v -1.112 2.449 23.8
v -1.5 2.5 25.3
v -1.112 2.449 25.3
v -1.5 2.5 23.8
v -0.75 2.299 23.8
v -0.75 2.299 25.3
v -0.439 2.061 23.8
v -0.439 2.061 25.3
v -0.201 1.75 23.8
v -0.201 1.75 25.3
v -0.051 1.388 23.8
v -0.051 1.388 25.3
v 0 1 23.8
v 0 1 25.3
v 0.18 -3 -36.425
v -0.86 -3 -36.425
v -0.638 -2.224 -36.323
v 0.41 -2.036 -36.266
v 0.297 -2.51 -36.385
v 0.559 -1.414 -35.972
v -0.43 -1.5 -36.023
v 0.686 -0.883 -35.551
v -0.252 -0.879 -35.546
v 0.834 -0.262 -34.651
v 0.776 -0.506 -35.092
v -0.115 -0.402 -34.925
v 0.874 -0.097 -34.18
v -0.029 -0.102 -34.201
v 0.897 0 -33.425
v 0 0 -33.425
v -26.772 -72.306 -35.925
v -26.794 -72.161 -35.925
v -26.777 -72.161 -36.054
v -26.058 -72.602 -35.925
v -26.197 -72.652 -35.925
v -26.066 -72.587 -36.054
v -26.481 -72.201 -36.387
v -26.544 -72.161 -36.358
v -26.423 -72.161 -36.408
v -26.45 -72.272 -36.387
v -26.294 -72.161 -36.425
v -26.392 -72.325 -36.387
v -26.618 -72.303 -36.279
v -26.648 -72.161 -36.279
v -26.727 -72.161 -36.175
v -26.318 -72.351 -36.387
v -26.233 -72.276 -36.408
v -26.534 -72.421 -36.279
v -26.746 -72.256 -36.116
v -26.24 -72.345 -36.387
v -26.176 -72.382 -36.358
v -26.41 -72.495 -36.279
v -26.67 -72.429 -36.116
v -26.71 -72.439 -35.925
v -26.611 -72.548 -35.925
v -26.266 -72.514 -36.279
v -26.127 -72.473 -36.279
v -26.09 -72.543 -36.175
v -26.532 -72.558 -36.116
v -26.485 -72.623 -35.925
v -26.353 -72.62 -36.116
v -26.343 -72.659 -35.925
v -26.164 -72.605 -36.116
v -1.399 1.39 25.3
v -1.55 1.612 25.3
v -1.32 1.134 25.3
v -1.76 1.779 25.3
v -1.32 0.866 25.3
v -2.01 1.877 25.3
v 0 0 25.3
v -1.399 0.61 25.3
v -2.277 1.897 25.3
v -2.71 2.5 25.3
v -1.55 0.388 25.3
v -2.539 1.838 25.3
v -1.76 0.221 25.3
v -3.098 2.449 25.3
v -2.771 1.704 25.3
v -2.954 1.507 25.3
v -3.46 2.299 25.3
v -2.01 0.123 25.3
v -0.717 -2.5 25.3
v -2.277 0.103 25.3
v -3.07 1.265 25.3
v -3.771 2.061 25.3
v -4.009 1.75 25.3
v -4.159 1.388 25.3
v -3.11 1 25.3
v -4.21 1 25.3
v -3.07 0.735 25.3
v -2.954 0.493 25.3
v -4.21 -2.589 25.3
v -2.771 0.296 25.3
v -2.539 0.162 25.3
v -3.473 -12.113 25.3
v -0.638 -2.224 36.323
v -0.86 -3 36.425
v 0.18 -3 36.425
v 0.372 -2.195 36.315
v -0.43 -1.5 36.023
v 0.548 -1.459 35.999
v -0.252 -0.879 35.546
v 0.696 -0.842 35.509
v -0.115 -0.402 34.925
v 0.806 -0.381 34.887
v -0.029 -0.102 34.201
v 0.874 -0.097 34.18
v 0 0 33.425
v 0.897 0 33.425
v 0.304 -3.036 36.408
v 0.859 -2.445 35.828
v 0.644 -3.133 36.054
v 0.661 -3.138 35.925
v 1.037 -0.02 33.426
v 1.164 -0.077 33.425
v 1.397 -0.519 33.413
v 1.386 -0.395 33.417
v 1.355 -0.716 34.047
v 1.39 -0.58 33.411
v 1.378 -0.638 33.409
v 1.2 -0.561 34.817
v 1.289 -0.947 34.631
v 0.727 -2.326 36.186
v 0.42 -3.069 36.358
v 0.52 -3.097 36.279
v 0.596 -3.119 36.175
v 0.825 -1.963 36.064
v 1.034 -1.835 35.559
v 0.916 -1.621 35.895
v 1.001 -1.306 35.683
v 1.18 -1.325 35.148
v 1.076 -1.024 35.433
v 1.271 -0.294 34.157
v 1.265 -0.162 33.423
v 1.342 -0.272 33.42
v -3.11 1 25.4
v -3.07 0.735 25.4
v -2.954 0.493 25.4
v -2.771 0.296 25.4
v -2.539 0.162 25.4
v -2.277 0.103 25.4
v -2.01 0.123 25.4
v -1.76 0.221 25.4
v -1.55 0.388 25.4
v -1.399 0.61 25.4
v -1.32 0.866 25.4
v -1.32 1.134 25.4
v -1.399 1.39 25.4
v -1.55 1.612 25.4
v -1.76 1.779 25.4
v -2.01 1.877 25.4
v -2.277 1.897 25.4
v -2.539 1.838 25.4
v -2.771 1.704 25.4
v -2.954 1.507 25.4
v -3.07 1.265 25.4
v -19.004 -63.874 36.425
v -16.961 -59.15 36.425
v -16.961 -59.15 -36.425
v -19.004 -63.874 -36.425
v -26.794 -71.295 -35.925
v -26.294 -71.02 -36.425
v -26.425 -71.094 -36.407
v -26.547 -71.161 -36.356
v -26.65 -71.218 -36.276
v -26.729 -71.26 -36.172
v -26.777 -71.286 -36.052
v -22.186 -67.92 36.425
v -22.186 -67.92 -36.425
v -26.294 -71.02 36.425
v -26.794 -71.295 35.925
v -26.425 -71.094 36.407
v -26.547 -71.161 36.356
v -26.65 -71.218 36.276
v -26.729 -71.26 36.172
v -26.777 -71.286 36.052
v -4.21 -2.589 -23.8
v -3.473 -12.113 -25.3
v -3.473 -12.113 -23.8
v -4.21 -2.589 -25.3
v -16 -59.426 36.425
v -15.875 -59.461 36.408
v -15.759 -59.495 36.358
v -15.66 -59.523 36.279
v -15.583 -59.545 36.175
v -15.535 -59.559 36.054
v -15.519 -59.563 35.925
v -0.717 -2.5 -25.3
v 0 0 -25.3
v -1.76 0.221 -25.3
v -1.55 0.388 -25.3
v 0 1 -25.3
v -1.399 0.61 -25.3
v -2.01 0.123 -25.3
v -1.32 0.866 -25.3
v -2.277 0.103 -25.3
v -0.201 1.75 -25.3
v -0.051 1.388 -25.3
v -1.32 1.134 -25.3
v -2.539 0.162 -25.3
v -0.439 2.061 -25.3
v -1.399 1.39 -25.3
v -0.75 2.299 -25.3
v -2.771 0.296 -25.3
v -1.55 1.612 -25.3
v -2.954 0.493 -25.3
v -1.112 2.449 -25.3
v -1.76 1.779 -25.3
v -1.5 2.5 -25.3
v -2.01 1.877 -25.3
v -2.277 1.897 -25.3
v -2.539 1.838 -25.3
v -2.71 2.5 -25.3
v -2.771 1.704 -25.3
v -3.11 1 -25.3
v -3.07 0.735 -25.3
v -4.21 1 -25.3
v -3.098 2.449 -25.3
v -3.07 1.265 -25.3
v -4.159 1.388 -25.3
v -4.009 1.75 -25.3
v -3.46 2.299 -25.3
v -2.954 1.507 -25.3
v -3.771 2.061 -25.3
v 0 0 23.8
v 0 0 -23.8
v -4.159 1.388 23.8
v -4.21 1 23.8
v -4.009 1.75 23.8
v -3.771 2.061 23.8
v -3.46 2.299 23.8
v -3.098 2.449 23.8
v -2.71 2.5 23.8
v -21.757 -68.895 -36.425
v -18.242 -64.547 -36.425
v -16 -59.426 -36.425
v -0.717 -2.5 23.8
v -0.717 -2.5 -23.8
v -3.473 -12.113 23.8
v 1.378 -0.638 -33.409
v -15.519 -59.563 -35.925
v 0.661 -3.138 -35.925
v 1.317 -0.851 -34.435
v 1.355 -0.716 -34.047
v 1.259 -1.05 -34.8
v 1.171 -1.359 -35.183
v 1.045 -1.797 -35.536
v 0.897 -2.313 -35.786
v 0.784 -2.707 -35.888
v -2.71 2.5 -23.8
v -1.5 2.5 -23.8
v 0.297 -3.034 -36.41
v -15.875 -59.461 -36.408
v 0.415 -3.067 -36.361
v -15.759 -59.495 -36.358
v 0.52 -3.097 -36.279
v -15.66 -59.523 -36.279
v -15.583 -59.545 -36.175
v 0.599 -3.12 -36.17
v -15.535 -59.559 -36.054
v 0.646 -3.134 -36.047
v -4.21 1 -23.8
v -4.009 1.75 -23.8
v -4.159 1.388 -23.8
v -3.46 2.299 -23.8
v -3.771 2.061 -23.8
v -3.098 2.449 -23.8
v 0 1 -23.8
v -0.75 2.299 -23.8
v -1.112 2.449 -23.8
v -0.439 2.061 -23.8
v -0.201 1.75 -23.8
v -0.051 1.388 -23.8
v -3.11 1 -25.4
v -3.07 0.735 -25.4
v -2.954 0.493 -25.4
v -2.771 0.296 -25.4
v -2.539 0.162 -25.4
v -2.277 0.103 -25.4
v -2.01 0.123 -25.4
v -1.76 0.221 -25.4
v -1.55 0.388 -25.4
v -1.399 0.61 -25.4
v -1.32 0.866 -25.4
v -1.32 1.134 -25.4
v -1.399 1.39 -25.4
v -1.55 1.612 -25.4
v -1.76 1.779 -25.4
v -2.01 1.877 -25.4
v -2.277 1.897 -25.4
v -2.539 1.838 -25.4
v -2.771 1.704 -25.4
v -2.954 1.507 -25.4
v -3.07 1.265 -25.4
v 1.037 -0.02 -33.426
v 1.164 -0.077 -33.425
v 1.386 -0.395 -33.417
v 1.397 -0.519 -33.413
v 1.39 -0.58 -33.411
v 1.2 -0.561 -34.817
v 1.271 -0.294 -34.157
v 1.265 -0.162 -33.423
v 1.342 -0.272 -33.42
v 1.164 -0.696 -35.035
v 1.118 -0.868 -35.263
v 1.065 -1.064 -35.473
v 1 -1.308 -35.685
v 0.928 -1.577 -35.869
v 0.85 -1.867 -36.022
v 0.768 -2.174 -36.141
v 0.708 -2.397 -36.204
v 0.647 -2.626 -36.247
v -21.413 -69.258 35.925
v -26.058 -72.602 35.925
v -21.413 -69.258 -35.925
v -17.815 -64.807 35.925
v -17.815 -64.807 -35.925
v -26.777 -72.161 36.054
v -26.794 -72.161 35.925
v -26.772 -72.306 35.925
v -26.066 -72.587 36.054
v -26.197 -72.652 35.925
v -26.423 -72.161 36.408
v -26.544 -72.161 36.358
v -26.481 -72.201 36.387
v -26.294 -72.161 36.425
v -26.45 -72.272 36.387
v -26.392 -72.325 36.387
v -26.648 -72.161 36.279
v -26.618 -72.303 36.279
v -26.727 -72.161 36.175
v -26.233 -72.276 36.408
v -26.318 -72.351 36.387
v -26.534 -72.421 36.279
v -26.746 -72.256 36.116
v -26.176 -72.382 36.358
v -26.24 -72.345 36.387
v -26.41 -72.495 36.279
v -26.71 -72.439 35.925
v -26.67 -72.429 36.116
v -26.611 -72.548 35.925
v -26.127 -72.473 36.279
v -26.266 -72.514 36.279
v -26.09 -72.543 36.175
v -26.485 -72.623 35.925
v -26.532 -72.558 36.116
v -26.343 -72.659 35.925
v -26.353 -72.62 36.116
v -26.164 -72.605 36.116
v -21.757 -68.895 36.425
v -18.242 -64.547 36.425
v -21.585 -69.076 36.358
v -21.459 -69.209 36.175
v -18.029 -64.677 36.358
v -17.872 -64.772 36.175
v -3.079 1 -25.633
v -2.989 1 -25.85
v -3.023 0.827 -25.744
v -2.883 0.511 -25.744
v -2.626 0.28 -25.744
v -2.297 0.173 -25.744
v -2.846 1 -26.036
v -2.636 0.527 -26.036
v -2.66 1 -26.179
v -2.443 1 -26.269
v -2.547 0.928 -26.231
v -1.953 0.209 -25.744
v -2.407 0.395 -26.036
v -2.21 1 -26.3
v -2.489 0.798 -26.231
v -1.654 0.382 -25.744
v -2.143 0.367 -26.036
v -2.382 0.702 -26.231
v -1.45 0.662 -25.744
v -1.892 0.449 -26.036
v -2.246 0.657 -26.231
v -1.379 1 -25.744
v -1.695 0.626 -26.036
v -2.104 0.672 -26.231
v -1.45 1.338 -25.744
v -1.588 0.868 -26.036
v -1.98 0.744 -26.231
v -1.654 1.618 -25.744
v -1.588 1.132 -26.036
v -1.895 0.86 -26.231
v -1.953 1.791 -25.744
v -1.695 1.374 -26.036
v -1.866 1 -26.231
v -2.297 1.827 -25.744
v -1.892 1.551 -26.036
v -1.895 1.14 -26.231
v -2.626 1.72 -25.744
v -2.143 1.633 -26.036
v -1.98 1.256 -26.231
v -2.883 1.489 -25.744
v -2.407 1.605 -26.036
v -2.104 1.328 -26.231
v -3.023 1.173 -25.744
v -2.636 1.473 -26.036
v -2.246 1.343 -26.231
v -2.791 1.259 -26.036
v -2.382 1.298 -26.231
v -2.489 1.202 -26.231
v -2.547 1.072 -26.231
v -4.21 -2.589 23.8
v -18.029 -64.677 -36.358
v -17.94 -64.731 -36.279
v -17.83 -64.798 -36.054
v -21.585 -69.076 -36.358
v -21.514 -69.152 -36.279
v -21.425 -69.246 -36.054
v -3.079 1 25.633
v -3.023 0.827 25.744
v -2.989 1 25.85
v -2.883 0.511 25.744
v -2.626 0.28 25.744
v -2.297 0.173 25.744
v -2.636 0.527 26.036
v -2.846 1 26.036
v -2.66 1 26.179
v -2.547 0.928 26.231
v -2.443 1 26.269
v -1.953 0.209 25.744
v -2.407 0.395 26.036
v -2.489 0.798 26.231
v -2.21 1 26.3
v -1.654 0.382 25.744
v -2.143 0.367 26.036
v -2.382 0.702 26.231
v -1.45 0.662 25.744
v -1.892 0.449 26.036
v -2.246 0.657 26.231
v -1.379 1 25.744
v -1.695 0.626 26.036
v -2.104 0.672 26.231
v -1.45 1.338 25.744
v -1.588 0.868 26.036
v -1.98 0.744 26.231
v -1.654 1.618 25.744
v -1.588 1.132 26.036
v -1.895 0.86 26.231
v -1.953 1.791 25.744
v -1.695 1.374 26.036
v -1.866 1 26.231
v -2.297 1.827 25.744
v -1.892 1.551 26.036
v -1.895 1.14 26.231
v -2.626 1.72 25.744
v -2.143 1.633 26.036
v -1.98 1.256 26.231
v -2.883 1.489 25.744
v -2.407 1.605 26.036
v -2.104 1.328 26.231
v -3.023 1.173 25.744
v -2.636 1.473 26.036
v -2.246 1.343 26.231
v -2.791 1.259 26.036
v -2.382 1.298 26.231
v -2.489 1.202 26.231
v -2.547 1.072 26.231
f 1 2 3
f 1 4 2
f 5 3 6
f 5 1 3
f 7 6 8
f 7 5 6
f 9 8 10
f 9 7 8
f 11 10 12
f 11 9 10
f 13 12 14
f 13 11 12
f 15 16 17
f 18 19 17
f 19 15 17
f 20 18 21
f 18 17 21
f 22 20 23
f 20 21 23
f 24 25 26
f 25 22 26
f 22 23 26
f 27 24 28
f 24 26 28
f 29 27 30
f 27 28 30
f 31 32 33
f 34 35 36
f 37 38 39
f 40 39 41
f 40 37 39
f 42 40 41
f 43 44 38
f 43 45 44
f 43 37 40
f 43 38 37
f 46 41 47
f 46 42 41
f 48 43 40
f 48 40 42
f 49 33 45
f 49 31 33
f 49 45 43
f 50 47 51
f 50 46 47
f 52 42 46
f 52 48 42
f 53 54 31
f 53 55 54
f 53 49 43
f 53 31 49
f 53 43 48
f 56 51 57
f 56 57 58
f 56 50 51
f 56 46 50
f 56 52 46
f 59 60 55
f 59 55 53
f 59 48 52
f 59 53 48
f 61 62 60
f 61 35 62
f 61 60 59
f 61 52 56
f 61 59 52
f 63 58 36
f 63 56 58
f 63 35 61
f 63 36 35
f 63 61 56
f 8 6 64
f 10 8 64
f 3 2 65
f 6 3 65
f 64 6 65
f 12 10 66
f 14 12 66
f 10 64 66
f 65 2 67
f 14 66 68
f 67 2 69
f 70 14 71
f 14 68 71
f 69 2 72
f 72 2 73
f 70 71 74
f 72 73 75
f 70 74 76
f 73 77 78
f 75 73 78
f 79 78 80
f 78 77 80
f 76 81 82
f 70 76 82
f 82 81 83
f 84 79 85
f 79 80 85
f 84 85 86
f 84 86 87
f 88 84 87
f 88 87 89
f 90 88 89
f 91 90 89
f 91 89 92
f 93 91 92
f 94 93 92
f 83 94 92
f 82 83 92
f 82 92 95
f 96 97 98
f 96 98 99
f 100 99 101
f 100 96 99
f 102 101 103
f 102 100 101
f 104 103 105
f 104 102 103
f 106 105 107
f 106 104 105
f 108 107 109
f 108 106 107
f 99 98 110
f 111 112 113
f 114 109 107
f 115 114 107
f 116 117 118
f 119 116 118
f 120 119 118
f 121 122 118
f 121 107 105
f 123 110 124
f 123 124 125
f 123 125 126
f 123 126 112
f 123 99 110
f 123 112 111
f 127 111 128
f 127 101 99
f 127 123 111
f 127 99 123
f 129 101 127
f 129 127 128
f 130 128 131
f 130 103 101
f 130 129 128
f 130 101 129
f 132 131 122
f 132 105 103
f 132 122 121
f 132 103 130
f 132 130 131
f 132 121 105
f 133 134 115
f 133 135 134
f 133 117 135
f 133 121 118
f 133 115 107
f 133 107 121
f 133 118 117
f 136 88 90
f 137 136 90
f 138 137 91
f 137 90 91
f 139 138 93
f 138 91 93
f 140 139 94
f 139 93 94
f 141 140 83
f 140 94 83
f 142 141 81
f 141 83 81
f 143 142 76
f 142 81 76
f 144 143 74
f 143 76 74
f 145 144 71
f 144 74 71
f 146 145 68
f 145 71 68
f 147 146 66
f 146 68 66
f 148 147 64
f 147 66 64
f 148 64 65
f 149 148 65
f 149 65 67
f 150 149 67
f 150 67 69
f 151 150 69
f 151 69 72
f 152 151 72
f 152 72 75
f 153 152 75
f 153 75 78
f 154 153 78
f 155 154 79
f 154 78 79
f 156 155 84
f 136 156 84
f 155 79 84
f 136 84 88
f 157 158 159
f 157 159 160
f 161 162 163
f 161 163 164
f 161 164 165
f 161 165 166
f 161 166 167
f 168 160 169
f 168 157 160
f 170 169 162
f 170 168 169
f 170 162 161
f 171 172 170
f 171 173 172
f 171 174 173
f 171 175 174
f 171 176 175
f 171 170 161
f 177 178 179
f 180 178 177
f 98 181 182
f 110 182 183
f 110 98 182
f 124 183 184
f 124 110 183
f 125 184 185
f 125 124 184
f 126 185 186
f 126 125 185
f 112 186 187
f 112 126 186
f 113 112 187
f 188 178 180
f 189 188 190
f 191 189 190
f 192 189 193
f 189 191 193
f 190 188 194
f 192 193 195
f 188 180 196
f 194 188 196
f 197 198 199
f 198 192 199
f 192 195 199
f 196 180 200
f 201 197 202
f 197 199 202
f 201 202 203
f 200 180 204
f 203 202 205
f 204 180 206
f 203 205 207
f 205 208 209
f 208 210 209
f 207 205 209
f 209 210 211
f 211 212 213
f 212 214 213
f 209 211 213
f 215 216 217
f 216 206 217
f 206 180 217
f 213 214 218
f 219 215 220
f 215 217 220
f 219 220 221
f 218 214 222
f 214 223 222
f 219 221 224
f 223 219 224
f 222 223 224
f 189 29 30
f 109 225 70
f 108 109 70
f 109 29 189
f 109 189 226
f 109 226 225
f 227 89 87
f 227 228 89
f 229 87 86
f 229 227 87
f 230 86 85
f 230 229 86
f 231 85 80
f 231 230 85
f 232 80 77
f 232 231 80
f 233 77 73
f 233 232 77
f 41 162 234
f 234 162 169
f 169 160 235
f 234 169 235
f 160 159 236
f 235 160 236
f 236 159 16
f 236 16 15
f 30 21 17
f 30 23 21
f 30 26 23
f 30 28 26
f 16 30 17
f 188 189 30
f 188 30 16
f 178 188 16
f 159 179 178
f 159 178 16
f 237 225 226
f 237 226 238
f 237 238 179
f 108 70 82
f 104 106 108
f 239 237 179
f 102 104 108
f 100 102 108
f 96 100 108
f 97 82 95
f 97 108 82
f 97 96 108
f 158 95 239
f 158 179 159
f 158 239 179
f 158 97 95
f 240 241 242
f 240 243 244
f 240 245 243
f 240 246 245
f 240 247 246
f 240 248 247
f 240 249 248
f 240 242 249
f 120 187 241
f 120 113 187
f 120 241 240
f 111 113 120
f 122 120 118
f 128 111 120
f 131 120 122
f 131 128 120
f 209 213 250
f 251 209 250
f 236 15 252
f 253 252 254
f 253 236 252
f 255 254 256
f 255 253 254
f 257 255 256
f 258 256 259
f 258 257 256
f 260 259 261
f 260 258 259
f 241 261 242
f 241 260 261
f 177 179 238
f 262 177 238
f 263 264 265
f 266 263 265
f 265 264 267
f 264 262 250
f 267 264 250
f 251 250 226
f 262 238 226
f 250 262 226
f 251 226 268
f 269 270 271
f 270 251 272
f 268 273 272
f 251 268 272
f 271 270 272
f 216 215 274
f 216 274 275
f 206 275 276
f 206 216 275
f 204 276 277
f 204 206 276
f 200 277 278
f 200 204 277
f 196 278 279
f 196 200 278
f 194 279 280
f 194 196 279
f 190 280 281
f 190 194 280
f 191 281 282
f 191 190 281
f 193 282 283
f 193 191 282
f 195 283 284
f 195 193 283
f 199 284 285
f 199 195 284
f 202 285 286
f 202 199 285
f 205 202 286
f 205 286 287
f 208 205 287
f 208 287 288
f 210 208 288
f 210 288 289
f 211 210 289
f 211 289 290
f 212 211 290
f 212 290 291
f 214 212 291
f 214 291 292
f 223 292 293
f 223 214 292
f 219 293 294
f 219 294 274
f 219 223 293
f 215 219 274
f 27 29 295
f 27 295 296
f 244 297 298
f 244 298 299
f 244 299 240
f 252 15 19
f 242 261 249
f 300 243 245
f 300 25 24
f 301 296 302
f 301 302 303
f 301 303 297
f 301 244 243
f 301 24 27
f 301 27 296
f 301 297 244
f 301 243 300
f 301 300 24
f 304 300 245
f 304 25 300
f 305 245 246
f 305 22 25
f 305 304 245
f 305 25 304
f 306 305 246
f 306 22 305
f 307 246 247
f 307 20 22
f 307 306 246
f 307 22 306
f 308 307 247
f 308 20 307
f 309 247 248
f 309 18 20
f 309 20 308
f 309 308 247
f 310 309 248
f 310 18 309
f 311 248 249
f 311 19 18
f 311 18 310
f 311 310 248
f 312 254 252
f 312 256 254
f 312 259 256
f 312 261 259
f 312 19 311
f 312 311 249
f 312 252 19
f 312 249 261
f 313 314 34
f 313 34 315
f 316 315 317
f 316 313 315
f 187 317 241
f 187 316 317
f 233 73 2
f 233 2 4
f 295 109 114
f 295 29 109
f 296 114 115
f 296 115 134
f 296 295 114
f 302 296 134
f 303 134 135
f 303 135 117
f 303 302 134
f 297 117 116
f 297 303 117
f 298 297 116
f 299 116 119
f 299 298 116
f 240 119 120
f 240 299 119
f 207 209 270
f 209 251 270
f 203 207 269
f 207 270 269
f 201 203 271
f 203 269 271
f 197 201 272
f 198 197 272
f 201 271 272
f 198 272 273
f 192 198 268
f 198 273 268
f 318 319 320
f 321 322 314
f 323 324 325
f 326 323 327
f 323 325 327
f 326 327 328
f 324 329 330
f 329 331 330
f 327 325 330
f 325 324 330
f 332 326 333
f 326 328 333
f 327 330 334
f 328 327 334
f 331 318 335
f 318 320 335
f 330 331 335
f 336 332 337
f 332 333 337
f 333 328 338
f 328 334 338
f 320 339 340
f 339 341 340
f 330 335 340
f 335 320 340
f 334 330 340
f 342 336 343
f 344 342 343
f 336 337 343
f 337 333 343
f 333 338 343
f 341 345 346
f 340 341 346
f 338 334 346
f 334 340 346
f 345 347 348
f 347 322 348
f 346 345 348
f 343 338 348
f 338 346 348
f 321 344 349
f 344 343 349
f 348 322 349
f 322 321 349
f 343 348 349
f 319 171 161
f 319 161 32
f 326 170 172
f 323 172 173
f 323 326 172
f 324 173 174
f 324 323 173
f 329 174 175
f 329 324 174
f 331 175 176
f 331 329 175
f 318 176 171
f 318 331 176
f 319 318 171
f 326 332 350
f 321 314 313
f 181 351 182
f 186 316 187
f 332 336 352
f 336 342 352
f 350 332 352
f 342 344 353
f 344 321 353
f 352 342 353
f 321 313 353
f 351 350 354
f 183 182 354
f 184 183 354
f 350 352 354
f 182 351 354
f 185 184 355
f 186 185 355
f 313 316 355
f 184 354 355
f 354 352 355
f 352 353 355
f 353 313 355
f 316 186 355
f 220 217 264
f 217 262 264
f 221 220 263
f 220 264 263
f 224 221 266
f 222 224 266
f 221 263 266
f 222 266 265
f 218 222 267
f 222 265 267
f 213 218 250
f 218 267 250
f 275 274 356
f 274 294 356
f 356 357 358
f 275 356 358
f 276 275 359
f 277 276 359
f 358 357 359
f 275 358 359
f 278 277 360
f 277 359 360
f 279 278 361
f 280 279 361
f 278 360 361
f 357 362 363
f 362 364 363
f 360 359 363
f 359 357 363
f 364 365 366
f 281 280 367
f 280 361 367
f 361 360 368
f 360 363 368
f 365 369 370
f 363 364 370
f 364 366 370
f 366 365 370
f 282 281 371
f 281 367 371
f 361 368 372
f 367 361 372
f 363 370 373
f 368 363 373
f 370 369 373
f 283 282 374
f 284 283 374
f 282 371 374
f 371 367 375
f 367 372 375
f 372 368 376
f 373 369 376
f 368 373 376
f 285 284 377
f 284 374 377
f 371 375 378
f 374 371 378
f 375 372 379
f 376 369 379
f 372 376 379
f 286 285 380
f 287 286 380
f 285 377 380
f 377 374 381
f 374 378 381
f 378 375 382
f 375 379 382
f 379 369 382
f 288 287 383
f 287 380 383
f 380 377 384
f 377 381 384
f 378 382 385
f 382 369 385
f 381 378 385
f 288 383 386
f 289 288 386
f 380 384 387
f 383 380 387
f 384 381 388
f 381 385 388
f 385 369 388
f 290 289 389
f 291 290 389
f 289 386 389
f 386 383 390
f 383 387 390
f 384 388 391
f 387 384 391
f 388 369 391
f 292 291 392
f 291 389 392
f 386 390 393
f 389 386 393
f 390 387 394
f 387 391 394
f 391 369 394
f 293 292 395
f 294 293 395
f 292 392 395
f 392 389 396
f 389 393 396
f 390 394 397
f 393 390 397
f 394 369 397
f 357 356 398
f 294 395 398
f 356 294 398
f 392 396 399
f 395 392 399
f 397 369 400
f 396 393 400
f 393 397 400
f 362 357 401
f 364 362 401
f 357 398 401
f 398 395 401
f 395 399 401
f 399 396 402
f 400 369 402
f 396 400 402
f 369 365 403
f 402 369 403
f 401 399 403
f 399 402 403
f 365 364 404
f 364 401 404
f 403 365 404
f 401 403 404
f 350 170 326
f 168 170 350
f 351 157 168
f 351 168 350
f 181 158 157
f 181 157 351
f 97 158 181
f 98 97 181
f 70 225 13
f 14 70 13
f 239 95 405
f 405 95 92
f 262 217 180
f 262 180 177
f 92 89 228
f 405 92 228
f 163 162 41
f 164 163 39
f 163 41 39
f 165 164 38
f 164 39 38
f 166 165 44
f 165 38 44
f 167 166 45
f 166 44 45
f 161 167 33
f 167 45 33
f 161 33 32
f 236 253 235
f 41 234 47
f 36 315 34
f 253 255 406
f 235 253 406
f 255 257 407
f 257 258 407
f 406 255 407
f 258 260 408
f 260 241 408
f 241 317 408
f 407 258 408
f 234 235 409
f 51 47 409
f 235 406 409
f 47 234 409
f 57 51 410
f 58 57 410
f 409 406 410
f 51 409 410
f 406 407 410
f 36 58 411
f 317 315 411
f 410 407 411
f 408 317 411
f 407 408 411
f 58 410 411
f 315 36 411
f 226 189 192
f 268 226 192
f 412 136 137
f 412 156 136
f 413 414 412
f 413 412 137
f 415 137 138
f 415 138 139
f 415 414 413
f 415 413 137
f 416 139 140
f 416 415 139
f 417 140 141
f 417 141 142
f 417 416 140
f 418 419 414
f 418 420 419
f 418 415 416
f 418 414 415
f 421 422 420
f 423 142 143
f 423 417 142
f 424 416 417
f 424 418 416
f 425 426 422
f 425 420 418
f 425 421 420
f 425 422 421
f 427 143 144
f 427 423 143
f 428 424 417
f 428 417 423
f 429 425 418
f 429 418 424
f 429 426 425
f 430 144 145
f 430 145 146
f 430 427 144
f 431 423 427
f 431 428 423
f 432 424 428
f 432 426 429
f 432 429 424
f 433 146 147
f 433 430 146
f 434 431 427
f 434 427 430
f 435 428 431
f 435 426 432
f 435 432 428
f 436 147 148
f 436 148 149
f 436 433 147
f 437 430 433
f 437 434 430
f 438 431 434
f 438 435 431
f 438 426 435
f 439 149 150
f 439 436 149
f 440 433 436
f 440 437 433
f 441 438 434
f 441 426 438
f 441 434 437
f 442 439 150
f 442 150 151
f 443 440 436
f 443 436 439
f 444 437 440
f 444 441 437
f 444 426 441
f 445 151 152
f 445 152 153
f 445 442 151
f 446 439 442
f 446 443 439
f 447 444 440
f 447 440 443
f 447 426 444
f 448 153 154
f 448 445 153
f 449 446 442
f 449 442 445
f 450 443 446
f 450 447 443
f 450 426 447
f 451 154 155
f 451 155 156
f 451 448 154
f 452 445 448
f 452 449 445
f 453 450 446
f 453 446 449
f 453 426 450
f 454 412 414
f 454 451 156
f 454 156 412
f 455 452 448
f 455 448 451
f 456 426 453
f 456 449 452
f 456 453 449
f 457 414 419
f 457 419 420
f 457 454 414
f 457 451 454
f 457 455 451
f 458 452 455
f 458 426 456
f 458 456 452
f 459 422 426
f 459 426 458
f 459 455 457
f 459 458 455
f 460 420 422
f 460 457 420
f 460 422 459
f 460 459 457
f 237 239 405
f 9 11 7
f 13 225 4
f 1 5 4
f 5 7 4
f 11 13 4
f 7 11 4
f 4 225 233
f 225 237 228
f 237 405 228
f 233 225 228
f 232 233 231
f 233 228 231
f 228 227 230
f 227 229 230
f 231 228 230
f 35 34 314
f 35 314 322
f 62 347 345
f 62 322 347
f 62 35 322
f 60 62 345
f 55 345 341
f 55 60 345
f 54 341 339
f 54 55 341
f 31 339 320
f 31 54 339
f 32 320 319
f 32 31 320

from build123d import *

# Parameters (mm, degrees)
BOSS_EXTRUDE1_DEPTH   = 36.425
CUT_EXTRUDE1_DEPTH    = 109.688749553
CUT_EXTRUDE2_DEPTH    = 108.700665357
FILLET1_R             = 3
BOSS_EXTRUDE12_REACH  = 92.061
BOSS_EXTRUDE12_START  = -4.21
SKETCH27_W            = 1.5
SKETCH27_H            = 5
CUT_EXTRUDE9_REACH    = 101.265
SKETCH30_W            = 0.716863464
SKETCH30_H            = 2.5
SKETCH31_R            = 0.9
BOSS_EXTRUDE13_DEPTH  = 1
FILLET9_R             = 1.5
FILLET10_R            = 1.5
FILLET11_R            = 0.9
FILLET9_OF_MIRROR4_R  = 1.5
FILLET10_OF_MIRROR4_R = 1.5
FILLET11_OF_MIRROR4_R = 0.9
FILLET12_R            = 0.5


with BuildPart() as part:
    # Sketch1 → Boss-Extrude1 (new, symmetric)
    with BuildSketch(Plane.XY):
        with BuildLine():
            Line((0, 0), (-16.960989568, -59.15))
            ThreePointArc((-16.960989568, -59.15), (-22.197903753, -67.931549335), (-31.090696036, -72.977252884))
            Line((-31.090696036, -72.977252884), (-30.708531477, -74.427752884))
            ThreePointArc((-30.708531477, -74.427752884), (-21.148779773, -69.003621568), (-15.519097024, -59.563456034))
            Line((-15.519097024, -59.563456034), (1.441892544, -0.413456034))
            Line((1.441892544, -0.413456034), (1.560449154, 0))
            Line((1.560449154, 0), (0, 0))
        make_face()
    extrude(amount=BOSS_EXTRUDE1_DEPTH, both=True)

    # Sketch2 → Cut-Extrude1 (cut, through all)
    with BuildSketch(Plane.XY.offset(36.425)):
        with BuildLine():
            Line((-31.090696036, -72.977252884), (-26.79397136, -72.977252884))
            ThreePointArc((-26.79397136, -72.977252884), (-28.715962633, -73.797739058), (-30.708531477, -74.427752884))
            Line((-30.708531477, -74.427752884), (-31.090696036, -72.977252884))
        make_face()
    extrude(amount=-CUT_EXTRUDE1_DEPTH, mode=Mode.SUBTRACT)

    # Sketch3 → Cut-Extrude2 (cut, through all)
    with BuildSketch(Plane.XY.offset(36.425)):
        with BuildLine():
            Line((-26.79397136, -72.977252884), (-31.090696036, -72.977252884))
            ThreePointArc((-31.090696036, -72.977252884), (-28.893646337, -72.260311669), (-26.79397136, -71.294704568))
            Line((-26.79397136, -71.294704568), (-26.79397136, -72.977252884))
        make_face()
    extrude(amount=-CUT_EXTRUDE2_DEPTH, mode=Mode.SUBTRACT)

    # Fillet1
    fillet1_edges = [part.edges().sort_by_distance(p)[0] for p in [
        (0.780224577, 0, 36.425),
        (0.780224577, 0, -36.425),
    ]]
    fillet(fillet1_edges, radius=FILLET1_R)

    # Boss-Extrude12: up to this plane
    boss_extrude12_end = Plane(origin=(0, 0, 36.425), z_dir=(0.961261695938318, -0.27563735581700266, 0))
    # Sketch27 → Boss-Extrude12 (add, up to the surface)
    with BuildSketch(Plane(origin=(0, 0, 0), x_dir=(0, 0, -1), z_dir=(1, 0, 0)).offset(BOSS_EXTRUDE12_START), mode=Mode.PRIVATE) as boss_extrude12_sk1:
        with Locations((-24.55, 0)):
            Rectangle(SKETCH27_W, SKETCH27_H)
    boss_extrude12_tool1 = split(extrude(boss_extrude12_sk1.sketch, amount=BOSS_EXTRUDE12_REACH, mode=Mode.PRIVATE), bisect_by=boss_extrude12_end, keep=Keep.BOTH, mode=Mode.PRIVATE)
    boss_extrude12 = boss_extrude12_tool1.solids().sort_by_distance((-4.21, 0, 24.55))[0]
    add(boss_extrude12)

    # Sketch30 → Cut-Extrude9 (cut, up to next)
    with BuildSketch(Plane.XY.offset(25.3), mode=Mode.PRIVATE) as cut_extrude9_sk1:
        with Locations((0.358431732, 1.25)):
            Rectangle(SKETCH30_W, SKETCH30_H)
    cut_extrude9_tool1 = extrude(cut_extrude9_sk1.sketch, amount=-CUT_EXTRUDE9_REACH, mode=Mode.PRIVATE) & part.part
    cut_extrude9 = cut_extrude9_tool1.solids().sort_by_distance((0.358432, 1.25, 25.3))[0]
    add(cut_extrude9, mode=Mode.SUBTRACT)

    # Sketch31 → Boss-Extrude13 (add)
    with BuildSketch(Plane.XY.offset(25.3)):
        with Locations(Location((-2.21, 1, 0), (0, 0, 180))):
            Circle(SKETCH31_R)
    boss_extrude13 = extrude(amount=BOSS_EXTRUDE13_DEPTH)

    # Fillet9
    fillet9_edges = [part.edges().sort_by_distance(p)[0] for p in [
        (-4.21, 2.5, 24.55),
    ]]
    fillet(fillet9_edges, radius=FILLET9_R)

    # Fillet10
    fillet10_edges = [part.edges().sort_by_distance(p)[0] for p in [
        (0, 2.5, 24.55),
    ]]
    fillet(fillet10_edges, radius=FILLET10_R)

    # Fillet11
    fillet11_edges = [part.edges().sort_by_distance(p)[0] for p in [
        (-1.31, 1, 26.3),
    ]]
    fillet(fillet11_edges, radius=FILLET11_R)

    # Mirror4: Boss-Extrude12, Cut-Extrude9, Boss-Extrude13 across plane
    add(boss_extrude12.mirror(Plane.XY))
    add(cut_extrude9.mirror(Plane.XY), mode=Mode.SUBTRACT)
    add(boss_extrude13.mirror(Plane.XY))

    # Fillet9 of Mirror4
    fillet9_of_mirror4_edges = [part.edges().sort_by_distance(p)[0] for p in [
        (-4.21, 2.5, -24.55),
    ]]
    fillet(fillet9_of_mirror4_edges, radius=FILLET9_OF_MIRROR4_R)

    # Fillet10 of Mirror4
    fillet10_of_mirror4_edges = [part.edges().sort_by_distance(p)[0] for p in [
        (0, 2.5, -24.55),
    ]]
    fillet(fillet10_of_mirror4_edges, radius=FILLET10_OF_MIRROR4_R)

    # Fillet11 of Mirror4
    fillet11_of_mirror4_edges = [part.edges().sort_by_distance(p)[0] for p in [
        (-1.31, 1, -26.3),
    ]]
    fillet(fillet11_of_mirror4_edges, radius=FILLET11_OF_MIRROR4_R)

    # Fillet12
    fillet12_edges = [part.edges().sort_by_distance(p)[0] for p in [
        (-7.409442014, -31.281728017, 36.425),
        (-19.727971855, -67.471122669, -36.425),
        (-19.727971855, -67.471122669, 36.425),
        (-26.79397136, -72.977252884, 0),
        (-26.79397136, -72.135978726, -36.425),
        (-26.79397136, -72.135978726, 36.425),
        (1.560449154, 0, 0),
        (1.302457732, -0.899723012, 35.567156991),
        (1.302457732, -0.899723012, -35.567156991),
        (-7.409442014, -31.281728017, -36.425),
    ]]
    fillet(fillet12_edges, radius=FILLET12_R)

    # Chamfer1
    # the kernel refuses this chamfer: 10, 3.5 mm, written as the material it adds along each edge
    with BuildSketch(Plane(origin=(-0.716863464, -2.5, 25.3), x_dir=(-0.26268080042718933, -0.9648827892997839, 0), z_dir=(0, 0, -1))) as chamfer1_piece_1_section:
        with BuildLine():
            Line((10.375794366, 0), (0.542683512, 3.511617253))
            Line((0.542683512, 3.511617253), (0.349706955, 3.564153413))
            ThreePointArc((0.349706955, 3.564153413), (0.270766903, 1.755965125), (-0.192976558, 0.05253616))
            Line((-0.192976558, 0.05253616), (0.00269055, -0.199981902))
            ThreePointArc((0.00269055, -0.199981902), (5.189648845, -0.130196738), (10.378484916, -0.199981902))
            Line((10.378484916, -0.199981902), (10.375794366, 0))
        make_face()
    chamfer1_piece_1 = extrude(amount=1.5, mode=Mode.PRIVATE)
    chamfer1_piece_1 = split(chamfer1_piece_1, bisect_by=Plane(origin=(-4.21, -5.808119571, 24.55), z_dir=(1, 0, 0)), keep=Keep.TOP, mode=Mode.PRIVATE)
    add(chamfer1_piece_1)
    with BuildSketch(Plane(origin=(-0.716863464, -2.5, -25.3), x_dir=(-0.26268080042718933, -0.9648827892997839, 0), z_dir=(0, 0, 1))) as chamfer1_piece_2_section:
        with BuildLine():
            Line((10.375794366, 0), (0.542683512, -3.511617253))
            Line((0.542683512, -3.511617253), (0.349706955, -3.564153413))
            ThreePointArc((0.349706955, -3.564153413), (0.270766903, -1.755965125), (-0.192976558, -0.05253616))
            Line((-0.192976558, -0.05253616), (0.00269055, 0.199981902))
            ThreePointArc((0.00269055, 0.199981902), (5.189648845, 0.130196738), (10.378484916, 0.199981902))
            Line((10.378484916, 0.199981902), (10.375794366, 0))
        make_face()
    chamfer1_piece_2 = extrude(amount=1.5, mode=Mode.PRIVATE)
    chamfer1_piece_2 = split(chamfer1_piece_2, bisect_by=Plane(origin=(-4.21, -5.808119571, -24.55), z_dir=(1, 0, 0)), keep=Keep.TOP, mode=Mode.PRIVATE)
    add(chamfer1_piece_2)


solid = part.part
